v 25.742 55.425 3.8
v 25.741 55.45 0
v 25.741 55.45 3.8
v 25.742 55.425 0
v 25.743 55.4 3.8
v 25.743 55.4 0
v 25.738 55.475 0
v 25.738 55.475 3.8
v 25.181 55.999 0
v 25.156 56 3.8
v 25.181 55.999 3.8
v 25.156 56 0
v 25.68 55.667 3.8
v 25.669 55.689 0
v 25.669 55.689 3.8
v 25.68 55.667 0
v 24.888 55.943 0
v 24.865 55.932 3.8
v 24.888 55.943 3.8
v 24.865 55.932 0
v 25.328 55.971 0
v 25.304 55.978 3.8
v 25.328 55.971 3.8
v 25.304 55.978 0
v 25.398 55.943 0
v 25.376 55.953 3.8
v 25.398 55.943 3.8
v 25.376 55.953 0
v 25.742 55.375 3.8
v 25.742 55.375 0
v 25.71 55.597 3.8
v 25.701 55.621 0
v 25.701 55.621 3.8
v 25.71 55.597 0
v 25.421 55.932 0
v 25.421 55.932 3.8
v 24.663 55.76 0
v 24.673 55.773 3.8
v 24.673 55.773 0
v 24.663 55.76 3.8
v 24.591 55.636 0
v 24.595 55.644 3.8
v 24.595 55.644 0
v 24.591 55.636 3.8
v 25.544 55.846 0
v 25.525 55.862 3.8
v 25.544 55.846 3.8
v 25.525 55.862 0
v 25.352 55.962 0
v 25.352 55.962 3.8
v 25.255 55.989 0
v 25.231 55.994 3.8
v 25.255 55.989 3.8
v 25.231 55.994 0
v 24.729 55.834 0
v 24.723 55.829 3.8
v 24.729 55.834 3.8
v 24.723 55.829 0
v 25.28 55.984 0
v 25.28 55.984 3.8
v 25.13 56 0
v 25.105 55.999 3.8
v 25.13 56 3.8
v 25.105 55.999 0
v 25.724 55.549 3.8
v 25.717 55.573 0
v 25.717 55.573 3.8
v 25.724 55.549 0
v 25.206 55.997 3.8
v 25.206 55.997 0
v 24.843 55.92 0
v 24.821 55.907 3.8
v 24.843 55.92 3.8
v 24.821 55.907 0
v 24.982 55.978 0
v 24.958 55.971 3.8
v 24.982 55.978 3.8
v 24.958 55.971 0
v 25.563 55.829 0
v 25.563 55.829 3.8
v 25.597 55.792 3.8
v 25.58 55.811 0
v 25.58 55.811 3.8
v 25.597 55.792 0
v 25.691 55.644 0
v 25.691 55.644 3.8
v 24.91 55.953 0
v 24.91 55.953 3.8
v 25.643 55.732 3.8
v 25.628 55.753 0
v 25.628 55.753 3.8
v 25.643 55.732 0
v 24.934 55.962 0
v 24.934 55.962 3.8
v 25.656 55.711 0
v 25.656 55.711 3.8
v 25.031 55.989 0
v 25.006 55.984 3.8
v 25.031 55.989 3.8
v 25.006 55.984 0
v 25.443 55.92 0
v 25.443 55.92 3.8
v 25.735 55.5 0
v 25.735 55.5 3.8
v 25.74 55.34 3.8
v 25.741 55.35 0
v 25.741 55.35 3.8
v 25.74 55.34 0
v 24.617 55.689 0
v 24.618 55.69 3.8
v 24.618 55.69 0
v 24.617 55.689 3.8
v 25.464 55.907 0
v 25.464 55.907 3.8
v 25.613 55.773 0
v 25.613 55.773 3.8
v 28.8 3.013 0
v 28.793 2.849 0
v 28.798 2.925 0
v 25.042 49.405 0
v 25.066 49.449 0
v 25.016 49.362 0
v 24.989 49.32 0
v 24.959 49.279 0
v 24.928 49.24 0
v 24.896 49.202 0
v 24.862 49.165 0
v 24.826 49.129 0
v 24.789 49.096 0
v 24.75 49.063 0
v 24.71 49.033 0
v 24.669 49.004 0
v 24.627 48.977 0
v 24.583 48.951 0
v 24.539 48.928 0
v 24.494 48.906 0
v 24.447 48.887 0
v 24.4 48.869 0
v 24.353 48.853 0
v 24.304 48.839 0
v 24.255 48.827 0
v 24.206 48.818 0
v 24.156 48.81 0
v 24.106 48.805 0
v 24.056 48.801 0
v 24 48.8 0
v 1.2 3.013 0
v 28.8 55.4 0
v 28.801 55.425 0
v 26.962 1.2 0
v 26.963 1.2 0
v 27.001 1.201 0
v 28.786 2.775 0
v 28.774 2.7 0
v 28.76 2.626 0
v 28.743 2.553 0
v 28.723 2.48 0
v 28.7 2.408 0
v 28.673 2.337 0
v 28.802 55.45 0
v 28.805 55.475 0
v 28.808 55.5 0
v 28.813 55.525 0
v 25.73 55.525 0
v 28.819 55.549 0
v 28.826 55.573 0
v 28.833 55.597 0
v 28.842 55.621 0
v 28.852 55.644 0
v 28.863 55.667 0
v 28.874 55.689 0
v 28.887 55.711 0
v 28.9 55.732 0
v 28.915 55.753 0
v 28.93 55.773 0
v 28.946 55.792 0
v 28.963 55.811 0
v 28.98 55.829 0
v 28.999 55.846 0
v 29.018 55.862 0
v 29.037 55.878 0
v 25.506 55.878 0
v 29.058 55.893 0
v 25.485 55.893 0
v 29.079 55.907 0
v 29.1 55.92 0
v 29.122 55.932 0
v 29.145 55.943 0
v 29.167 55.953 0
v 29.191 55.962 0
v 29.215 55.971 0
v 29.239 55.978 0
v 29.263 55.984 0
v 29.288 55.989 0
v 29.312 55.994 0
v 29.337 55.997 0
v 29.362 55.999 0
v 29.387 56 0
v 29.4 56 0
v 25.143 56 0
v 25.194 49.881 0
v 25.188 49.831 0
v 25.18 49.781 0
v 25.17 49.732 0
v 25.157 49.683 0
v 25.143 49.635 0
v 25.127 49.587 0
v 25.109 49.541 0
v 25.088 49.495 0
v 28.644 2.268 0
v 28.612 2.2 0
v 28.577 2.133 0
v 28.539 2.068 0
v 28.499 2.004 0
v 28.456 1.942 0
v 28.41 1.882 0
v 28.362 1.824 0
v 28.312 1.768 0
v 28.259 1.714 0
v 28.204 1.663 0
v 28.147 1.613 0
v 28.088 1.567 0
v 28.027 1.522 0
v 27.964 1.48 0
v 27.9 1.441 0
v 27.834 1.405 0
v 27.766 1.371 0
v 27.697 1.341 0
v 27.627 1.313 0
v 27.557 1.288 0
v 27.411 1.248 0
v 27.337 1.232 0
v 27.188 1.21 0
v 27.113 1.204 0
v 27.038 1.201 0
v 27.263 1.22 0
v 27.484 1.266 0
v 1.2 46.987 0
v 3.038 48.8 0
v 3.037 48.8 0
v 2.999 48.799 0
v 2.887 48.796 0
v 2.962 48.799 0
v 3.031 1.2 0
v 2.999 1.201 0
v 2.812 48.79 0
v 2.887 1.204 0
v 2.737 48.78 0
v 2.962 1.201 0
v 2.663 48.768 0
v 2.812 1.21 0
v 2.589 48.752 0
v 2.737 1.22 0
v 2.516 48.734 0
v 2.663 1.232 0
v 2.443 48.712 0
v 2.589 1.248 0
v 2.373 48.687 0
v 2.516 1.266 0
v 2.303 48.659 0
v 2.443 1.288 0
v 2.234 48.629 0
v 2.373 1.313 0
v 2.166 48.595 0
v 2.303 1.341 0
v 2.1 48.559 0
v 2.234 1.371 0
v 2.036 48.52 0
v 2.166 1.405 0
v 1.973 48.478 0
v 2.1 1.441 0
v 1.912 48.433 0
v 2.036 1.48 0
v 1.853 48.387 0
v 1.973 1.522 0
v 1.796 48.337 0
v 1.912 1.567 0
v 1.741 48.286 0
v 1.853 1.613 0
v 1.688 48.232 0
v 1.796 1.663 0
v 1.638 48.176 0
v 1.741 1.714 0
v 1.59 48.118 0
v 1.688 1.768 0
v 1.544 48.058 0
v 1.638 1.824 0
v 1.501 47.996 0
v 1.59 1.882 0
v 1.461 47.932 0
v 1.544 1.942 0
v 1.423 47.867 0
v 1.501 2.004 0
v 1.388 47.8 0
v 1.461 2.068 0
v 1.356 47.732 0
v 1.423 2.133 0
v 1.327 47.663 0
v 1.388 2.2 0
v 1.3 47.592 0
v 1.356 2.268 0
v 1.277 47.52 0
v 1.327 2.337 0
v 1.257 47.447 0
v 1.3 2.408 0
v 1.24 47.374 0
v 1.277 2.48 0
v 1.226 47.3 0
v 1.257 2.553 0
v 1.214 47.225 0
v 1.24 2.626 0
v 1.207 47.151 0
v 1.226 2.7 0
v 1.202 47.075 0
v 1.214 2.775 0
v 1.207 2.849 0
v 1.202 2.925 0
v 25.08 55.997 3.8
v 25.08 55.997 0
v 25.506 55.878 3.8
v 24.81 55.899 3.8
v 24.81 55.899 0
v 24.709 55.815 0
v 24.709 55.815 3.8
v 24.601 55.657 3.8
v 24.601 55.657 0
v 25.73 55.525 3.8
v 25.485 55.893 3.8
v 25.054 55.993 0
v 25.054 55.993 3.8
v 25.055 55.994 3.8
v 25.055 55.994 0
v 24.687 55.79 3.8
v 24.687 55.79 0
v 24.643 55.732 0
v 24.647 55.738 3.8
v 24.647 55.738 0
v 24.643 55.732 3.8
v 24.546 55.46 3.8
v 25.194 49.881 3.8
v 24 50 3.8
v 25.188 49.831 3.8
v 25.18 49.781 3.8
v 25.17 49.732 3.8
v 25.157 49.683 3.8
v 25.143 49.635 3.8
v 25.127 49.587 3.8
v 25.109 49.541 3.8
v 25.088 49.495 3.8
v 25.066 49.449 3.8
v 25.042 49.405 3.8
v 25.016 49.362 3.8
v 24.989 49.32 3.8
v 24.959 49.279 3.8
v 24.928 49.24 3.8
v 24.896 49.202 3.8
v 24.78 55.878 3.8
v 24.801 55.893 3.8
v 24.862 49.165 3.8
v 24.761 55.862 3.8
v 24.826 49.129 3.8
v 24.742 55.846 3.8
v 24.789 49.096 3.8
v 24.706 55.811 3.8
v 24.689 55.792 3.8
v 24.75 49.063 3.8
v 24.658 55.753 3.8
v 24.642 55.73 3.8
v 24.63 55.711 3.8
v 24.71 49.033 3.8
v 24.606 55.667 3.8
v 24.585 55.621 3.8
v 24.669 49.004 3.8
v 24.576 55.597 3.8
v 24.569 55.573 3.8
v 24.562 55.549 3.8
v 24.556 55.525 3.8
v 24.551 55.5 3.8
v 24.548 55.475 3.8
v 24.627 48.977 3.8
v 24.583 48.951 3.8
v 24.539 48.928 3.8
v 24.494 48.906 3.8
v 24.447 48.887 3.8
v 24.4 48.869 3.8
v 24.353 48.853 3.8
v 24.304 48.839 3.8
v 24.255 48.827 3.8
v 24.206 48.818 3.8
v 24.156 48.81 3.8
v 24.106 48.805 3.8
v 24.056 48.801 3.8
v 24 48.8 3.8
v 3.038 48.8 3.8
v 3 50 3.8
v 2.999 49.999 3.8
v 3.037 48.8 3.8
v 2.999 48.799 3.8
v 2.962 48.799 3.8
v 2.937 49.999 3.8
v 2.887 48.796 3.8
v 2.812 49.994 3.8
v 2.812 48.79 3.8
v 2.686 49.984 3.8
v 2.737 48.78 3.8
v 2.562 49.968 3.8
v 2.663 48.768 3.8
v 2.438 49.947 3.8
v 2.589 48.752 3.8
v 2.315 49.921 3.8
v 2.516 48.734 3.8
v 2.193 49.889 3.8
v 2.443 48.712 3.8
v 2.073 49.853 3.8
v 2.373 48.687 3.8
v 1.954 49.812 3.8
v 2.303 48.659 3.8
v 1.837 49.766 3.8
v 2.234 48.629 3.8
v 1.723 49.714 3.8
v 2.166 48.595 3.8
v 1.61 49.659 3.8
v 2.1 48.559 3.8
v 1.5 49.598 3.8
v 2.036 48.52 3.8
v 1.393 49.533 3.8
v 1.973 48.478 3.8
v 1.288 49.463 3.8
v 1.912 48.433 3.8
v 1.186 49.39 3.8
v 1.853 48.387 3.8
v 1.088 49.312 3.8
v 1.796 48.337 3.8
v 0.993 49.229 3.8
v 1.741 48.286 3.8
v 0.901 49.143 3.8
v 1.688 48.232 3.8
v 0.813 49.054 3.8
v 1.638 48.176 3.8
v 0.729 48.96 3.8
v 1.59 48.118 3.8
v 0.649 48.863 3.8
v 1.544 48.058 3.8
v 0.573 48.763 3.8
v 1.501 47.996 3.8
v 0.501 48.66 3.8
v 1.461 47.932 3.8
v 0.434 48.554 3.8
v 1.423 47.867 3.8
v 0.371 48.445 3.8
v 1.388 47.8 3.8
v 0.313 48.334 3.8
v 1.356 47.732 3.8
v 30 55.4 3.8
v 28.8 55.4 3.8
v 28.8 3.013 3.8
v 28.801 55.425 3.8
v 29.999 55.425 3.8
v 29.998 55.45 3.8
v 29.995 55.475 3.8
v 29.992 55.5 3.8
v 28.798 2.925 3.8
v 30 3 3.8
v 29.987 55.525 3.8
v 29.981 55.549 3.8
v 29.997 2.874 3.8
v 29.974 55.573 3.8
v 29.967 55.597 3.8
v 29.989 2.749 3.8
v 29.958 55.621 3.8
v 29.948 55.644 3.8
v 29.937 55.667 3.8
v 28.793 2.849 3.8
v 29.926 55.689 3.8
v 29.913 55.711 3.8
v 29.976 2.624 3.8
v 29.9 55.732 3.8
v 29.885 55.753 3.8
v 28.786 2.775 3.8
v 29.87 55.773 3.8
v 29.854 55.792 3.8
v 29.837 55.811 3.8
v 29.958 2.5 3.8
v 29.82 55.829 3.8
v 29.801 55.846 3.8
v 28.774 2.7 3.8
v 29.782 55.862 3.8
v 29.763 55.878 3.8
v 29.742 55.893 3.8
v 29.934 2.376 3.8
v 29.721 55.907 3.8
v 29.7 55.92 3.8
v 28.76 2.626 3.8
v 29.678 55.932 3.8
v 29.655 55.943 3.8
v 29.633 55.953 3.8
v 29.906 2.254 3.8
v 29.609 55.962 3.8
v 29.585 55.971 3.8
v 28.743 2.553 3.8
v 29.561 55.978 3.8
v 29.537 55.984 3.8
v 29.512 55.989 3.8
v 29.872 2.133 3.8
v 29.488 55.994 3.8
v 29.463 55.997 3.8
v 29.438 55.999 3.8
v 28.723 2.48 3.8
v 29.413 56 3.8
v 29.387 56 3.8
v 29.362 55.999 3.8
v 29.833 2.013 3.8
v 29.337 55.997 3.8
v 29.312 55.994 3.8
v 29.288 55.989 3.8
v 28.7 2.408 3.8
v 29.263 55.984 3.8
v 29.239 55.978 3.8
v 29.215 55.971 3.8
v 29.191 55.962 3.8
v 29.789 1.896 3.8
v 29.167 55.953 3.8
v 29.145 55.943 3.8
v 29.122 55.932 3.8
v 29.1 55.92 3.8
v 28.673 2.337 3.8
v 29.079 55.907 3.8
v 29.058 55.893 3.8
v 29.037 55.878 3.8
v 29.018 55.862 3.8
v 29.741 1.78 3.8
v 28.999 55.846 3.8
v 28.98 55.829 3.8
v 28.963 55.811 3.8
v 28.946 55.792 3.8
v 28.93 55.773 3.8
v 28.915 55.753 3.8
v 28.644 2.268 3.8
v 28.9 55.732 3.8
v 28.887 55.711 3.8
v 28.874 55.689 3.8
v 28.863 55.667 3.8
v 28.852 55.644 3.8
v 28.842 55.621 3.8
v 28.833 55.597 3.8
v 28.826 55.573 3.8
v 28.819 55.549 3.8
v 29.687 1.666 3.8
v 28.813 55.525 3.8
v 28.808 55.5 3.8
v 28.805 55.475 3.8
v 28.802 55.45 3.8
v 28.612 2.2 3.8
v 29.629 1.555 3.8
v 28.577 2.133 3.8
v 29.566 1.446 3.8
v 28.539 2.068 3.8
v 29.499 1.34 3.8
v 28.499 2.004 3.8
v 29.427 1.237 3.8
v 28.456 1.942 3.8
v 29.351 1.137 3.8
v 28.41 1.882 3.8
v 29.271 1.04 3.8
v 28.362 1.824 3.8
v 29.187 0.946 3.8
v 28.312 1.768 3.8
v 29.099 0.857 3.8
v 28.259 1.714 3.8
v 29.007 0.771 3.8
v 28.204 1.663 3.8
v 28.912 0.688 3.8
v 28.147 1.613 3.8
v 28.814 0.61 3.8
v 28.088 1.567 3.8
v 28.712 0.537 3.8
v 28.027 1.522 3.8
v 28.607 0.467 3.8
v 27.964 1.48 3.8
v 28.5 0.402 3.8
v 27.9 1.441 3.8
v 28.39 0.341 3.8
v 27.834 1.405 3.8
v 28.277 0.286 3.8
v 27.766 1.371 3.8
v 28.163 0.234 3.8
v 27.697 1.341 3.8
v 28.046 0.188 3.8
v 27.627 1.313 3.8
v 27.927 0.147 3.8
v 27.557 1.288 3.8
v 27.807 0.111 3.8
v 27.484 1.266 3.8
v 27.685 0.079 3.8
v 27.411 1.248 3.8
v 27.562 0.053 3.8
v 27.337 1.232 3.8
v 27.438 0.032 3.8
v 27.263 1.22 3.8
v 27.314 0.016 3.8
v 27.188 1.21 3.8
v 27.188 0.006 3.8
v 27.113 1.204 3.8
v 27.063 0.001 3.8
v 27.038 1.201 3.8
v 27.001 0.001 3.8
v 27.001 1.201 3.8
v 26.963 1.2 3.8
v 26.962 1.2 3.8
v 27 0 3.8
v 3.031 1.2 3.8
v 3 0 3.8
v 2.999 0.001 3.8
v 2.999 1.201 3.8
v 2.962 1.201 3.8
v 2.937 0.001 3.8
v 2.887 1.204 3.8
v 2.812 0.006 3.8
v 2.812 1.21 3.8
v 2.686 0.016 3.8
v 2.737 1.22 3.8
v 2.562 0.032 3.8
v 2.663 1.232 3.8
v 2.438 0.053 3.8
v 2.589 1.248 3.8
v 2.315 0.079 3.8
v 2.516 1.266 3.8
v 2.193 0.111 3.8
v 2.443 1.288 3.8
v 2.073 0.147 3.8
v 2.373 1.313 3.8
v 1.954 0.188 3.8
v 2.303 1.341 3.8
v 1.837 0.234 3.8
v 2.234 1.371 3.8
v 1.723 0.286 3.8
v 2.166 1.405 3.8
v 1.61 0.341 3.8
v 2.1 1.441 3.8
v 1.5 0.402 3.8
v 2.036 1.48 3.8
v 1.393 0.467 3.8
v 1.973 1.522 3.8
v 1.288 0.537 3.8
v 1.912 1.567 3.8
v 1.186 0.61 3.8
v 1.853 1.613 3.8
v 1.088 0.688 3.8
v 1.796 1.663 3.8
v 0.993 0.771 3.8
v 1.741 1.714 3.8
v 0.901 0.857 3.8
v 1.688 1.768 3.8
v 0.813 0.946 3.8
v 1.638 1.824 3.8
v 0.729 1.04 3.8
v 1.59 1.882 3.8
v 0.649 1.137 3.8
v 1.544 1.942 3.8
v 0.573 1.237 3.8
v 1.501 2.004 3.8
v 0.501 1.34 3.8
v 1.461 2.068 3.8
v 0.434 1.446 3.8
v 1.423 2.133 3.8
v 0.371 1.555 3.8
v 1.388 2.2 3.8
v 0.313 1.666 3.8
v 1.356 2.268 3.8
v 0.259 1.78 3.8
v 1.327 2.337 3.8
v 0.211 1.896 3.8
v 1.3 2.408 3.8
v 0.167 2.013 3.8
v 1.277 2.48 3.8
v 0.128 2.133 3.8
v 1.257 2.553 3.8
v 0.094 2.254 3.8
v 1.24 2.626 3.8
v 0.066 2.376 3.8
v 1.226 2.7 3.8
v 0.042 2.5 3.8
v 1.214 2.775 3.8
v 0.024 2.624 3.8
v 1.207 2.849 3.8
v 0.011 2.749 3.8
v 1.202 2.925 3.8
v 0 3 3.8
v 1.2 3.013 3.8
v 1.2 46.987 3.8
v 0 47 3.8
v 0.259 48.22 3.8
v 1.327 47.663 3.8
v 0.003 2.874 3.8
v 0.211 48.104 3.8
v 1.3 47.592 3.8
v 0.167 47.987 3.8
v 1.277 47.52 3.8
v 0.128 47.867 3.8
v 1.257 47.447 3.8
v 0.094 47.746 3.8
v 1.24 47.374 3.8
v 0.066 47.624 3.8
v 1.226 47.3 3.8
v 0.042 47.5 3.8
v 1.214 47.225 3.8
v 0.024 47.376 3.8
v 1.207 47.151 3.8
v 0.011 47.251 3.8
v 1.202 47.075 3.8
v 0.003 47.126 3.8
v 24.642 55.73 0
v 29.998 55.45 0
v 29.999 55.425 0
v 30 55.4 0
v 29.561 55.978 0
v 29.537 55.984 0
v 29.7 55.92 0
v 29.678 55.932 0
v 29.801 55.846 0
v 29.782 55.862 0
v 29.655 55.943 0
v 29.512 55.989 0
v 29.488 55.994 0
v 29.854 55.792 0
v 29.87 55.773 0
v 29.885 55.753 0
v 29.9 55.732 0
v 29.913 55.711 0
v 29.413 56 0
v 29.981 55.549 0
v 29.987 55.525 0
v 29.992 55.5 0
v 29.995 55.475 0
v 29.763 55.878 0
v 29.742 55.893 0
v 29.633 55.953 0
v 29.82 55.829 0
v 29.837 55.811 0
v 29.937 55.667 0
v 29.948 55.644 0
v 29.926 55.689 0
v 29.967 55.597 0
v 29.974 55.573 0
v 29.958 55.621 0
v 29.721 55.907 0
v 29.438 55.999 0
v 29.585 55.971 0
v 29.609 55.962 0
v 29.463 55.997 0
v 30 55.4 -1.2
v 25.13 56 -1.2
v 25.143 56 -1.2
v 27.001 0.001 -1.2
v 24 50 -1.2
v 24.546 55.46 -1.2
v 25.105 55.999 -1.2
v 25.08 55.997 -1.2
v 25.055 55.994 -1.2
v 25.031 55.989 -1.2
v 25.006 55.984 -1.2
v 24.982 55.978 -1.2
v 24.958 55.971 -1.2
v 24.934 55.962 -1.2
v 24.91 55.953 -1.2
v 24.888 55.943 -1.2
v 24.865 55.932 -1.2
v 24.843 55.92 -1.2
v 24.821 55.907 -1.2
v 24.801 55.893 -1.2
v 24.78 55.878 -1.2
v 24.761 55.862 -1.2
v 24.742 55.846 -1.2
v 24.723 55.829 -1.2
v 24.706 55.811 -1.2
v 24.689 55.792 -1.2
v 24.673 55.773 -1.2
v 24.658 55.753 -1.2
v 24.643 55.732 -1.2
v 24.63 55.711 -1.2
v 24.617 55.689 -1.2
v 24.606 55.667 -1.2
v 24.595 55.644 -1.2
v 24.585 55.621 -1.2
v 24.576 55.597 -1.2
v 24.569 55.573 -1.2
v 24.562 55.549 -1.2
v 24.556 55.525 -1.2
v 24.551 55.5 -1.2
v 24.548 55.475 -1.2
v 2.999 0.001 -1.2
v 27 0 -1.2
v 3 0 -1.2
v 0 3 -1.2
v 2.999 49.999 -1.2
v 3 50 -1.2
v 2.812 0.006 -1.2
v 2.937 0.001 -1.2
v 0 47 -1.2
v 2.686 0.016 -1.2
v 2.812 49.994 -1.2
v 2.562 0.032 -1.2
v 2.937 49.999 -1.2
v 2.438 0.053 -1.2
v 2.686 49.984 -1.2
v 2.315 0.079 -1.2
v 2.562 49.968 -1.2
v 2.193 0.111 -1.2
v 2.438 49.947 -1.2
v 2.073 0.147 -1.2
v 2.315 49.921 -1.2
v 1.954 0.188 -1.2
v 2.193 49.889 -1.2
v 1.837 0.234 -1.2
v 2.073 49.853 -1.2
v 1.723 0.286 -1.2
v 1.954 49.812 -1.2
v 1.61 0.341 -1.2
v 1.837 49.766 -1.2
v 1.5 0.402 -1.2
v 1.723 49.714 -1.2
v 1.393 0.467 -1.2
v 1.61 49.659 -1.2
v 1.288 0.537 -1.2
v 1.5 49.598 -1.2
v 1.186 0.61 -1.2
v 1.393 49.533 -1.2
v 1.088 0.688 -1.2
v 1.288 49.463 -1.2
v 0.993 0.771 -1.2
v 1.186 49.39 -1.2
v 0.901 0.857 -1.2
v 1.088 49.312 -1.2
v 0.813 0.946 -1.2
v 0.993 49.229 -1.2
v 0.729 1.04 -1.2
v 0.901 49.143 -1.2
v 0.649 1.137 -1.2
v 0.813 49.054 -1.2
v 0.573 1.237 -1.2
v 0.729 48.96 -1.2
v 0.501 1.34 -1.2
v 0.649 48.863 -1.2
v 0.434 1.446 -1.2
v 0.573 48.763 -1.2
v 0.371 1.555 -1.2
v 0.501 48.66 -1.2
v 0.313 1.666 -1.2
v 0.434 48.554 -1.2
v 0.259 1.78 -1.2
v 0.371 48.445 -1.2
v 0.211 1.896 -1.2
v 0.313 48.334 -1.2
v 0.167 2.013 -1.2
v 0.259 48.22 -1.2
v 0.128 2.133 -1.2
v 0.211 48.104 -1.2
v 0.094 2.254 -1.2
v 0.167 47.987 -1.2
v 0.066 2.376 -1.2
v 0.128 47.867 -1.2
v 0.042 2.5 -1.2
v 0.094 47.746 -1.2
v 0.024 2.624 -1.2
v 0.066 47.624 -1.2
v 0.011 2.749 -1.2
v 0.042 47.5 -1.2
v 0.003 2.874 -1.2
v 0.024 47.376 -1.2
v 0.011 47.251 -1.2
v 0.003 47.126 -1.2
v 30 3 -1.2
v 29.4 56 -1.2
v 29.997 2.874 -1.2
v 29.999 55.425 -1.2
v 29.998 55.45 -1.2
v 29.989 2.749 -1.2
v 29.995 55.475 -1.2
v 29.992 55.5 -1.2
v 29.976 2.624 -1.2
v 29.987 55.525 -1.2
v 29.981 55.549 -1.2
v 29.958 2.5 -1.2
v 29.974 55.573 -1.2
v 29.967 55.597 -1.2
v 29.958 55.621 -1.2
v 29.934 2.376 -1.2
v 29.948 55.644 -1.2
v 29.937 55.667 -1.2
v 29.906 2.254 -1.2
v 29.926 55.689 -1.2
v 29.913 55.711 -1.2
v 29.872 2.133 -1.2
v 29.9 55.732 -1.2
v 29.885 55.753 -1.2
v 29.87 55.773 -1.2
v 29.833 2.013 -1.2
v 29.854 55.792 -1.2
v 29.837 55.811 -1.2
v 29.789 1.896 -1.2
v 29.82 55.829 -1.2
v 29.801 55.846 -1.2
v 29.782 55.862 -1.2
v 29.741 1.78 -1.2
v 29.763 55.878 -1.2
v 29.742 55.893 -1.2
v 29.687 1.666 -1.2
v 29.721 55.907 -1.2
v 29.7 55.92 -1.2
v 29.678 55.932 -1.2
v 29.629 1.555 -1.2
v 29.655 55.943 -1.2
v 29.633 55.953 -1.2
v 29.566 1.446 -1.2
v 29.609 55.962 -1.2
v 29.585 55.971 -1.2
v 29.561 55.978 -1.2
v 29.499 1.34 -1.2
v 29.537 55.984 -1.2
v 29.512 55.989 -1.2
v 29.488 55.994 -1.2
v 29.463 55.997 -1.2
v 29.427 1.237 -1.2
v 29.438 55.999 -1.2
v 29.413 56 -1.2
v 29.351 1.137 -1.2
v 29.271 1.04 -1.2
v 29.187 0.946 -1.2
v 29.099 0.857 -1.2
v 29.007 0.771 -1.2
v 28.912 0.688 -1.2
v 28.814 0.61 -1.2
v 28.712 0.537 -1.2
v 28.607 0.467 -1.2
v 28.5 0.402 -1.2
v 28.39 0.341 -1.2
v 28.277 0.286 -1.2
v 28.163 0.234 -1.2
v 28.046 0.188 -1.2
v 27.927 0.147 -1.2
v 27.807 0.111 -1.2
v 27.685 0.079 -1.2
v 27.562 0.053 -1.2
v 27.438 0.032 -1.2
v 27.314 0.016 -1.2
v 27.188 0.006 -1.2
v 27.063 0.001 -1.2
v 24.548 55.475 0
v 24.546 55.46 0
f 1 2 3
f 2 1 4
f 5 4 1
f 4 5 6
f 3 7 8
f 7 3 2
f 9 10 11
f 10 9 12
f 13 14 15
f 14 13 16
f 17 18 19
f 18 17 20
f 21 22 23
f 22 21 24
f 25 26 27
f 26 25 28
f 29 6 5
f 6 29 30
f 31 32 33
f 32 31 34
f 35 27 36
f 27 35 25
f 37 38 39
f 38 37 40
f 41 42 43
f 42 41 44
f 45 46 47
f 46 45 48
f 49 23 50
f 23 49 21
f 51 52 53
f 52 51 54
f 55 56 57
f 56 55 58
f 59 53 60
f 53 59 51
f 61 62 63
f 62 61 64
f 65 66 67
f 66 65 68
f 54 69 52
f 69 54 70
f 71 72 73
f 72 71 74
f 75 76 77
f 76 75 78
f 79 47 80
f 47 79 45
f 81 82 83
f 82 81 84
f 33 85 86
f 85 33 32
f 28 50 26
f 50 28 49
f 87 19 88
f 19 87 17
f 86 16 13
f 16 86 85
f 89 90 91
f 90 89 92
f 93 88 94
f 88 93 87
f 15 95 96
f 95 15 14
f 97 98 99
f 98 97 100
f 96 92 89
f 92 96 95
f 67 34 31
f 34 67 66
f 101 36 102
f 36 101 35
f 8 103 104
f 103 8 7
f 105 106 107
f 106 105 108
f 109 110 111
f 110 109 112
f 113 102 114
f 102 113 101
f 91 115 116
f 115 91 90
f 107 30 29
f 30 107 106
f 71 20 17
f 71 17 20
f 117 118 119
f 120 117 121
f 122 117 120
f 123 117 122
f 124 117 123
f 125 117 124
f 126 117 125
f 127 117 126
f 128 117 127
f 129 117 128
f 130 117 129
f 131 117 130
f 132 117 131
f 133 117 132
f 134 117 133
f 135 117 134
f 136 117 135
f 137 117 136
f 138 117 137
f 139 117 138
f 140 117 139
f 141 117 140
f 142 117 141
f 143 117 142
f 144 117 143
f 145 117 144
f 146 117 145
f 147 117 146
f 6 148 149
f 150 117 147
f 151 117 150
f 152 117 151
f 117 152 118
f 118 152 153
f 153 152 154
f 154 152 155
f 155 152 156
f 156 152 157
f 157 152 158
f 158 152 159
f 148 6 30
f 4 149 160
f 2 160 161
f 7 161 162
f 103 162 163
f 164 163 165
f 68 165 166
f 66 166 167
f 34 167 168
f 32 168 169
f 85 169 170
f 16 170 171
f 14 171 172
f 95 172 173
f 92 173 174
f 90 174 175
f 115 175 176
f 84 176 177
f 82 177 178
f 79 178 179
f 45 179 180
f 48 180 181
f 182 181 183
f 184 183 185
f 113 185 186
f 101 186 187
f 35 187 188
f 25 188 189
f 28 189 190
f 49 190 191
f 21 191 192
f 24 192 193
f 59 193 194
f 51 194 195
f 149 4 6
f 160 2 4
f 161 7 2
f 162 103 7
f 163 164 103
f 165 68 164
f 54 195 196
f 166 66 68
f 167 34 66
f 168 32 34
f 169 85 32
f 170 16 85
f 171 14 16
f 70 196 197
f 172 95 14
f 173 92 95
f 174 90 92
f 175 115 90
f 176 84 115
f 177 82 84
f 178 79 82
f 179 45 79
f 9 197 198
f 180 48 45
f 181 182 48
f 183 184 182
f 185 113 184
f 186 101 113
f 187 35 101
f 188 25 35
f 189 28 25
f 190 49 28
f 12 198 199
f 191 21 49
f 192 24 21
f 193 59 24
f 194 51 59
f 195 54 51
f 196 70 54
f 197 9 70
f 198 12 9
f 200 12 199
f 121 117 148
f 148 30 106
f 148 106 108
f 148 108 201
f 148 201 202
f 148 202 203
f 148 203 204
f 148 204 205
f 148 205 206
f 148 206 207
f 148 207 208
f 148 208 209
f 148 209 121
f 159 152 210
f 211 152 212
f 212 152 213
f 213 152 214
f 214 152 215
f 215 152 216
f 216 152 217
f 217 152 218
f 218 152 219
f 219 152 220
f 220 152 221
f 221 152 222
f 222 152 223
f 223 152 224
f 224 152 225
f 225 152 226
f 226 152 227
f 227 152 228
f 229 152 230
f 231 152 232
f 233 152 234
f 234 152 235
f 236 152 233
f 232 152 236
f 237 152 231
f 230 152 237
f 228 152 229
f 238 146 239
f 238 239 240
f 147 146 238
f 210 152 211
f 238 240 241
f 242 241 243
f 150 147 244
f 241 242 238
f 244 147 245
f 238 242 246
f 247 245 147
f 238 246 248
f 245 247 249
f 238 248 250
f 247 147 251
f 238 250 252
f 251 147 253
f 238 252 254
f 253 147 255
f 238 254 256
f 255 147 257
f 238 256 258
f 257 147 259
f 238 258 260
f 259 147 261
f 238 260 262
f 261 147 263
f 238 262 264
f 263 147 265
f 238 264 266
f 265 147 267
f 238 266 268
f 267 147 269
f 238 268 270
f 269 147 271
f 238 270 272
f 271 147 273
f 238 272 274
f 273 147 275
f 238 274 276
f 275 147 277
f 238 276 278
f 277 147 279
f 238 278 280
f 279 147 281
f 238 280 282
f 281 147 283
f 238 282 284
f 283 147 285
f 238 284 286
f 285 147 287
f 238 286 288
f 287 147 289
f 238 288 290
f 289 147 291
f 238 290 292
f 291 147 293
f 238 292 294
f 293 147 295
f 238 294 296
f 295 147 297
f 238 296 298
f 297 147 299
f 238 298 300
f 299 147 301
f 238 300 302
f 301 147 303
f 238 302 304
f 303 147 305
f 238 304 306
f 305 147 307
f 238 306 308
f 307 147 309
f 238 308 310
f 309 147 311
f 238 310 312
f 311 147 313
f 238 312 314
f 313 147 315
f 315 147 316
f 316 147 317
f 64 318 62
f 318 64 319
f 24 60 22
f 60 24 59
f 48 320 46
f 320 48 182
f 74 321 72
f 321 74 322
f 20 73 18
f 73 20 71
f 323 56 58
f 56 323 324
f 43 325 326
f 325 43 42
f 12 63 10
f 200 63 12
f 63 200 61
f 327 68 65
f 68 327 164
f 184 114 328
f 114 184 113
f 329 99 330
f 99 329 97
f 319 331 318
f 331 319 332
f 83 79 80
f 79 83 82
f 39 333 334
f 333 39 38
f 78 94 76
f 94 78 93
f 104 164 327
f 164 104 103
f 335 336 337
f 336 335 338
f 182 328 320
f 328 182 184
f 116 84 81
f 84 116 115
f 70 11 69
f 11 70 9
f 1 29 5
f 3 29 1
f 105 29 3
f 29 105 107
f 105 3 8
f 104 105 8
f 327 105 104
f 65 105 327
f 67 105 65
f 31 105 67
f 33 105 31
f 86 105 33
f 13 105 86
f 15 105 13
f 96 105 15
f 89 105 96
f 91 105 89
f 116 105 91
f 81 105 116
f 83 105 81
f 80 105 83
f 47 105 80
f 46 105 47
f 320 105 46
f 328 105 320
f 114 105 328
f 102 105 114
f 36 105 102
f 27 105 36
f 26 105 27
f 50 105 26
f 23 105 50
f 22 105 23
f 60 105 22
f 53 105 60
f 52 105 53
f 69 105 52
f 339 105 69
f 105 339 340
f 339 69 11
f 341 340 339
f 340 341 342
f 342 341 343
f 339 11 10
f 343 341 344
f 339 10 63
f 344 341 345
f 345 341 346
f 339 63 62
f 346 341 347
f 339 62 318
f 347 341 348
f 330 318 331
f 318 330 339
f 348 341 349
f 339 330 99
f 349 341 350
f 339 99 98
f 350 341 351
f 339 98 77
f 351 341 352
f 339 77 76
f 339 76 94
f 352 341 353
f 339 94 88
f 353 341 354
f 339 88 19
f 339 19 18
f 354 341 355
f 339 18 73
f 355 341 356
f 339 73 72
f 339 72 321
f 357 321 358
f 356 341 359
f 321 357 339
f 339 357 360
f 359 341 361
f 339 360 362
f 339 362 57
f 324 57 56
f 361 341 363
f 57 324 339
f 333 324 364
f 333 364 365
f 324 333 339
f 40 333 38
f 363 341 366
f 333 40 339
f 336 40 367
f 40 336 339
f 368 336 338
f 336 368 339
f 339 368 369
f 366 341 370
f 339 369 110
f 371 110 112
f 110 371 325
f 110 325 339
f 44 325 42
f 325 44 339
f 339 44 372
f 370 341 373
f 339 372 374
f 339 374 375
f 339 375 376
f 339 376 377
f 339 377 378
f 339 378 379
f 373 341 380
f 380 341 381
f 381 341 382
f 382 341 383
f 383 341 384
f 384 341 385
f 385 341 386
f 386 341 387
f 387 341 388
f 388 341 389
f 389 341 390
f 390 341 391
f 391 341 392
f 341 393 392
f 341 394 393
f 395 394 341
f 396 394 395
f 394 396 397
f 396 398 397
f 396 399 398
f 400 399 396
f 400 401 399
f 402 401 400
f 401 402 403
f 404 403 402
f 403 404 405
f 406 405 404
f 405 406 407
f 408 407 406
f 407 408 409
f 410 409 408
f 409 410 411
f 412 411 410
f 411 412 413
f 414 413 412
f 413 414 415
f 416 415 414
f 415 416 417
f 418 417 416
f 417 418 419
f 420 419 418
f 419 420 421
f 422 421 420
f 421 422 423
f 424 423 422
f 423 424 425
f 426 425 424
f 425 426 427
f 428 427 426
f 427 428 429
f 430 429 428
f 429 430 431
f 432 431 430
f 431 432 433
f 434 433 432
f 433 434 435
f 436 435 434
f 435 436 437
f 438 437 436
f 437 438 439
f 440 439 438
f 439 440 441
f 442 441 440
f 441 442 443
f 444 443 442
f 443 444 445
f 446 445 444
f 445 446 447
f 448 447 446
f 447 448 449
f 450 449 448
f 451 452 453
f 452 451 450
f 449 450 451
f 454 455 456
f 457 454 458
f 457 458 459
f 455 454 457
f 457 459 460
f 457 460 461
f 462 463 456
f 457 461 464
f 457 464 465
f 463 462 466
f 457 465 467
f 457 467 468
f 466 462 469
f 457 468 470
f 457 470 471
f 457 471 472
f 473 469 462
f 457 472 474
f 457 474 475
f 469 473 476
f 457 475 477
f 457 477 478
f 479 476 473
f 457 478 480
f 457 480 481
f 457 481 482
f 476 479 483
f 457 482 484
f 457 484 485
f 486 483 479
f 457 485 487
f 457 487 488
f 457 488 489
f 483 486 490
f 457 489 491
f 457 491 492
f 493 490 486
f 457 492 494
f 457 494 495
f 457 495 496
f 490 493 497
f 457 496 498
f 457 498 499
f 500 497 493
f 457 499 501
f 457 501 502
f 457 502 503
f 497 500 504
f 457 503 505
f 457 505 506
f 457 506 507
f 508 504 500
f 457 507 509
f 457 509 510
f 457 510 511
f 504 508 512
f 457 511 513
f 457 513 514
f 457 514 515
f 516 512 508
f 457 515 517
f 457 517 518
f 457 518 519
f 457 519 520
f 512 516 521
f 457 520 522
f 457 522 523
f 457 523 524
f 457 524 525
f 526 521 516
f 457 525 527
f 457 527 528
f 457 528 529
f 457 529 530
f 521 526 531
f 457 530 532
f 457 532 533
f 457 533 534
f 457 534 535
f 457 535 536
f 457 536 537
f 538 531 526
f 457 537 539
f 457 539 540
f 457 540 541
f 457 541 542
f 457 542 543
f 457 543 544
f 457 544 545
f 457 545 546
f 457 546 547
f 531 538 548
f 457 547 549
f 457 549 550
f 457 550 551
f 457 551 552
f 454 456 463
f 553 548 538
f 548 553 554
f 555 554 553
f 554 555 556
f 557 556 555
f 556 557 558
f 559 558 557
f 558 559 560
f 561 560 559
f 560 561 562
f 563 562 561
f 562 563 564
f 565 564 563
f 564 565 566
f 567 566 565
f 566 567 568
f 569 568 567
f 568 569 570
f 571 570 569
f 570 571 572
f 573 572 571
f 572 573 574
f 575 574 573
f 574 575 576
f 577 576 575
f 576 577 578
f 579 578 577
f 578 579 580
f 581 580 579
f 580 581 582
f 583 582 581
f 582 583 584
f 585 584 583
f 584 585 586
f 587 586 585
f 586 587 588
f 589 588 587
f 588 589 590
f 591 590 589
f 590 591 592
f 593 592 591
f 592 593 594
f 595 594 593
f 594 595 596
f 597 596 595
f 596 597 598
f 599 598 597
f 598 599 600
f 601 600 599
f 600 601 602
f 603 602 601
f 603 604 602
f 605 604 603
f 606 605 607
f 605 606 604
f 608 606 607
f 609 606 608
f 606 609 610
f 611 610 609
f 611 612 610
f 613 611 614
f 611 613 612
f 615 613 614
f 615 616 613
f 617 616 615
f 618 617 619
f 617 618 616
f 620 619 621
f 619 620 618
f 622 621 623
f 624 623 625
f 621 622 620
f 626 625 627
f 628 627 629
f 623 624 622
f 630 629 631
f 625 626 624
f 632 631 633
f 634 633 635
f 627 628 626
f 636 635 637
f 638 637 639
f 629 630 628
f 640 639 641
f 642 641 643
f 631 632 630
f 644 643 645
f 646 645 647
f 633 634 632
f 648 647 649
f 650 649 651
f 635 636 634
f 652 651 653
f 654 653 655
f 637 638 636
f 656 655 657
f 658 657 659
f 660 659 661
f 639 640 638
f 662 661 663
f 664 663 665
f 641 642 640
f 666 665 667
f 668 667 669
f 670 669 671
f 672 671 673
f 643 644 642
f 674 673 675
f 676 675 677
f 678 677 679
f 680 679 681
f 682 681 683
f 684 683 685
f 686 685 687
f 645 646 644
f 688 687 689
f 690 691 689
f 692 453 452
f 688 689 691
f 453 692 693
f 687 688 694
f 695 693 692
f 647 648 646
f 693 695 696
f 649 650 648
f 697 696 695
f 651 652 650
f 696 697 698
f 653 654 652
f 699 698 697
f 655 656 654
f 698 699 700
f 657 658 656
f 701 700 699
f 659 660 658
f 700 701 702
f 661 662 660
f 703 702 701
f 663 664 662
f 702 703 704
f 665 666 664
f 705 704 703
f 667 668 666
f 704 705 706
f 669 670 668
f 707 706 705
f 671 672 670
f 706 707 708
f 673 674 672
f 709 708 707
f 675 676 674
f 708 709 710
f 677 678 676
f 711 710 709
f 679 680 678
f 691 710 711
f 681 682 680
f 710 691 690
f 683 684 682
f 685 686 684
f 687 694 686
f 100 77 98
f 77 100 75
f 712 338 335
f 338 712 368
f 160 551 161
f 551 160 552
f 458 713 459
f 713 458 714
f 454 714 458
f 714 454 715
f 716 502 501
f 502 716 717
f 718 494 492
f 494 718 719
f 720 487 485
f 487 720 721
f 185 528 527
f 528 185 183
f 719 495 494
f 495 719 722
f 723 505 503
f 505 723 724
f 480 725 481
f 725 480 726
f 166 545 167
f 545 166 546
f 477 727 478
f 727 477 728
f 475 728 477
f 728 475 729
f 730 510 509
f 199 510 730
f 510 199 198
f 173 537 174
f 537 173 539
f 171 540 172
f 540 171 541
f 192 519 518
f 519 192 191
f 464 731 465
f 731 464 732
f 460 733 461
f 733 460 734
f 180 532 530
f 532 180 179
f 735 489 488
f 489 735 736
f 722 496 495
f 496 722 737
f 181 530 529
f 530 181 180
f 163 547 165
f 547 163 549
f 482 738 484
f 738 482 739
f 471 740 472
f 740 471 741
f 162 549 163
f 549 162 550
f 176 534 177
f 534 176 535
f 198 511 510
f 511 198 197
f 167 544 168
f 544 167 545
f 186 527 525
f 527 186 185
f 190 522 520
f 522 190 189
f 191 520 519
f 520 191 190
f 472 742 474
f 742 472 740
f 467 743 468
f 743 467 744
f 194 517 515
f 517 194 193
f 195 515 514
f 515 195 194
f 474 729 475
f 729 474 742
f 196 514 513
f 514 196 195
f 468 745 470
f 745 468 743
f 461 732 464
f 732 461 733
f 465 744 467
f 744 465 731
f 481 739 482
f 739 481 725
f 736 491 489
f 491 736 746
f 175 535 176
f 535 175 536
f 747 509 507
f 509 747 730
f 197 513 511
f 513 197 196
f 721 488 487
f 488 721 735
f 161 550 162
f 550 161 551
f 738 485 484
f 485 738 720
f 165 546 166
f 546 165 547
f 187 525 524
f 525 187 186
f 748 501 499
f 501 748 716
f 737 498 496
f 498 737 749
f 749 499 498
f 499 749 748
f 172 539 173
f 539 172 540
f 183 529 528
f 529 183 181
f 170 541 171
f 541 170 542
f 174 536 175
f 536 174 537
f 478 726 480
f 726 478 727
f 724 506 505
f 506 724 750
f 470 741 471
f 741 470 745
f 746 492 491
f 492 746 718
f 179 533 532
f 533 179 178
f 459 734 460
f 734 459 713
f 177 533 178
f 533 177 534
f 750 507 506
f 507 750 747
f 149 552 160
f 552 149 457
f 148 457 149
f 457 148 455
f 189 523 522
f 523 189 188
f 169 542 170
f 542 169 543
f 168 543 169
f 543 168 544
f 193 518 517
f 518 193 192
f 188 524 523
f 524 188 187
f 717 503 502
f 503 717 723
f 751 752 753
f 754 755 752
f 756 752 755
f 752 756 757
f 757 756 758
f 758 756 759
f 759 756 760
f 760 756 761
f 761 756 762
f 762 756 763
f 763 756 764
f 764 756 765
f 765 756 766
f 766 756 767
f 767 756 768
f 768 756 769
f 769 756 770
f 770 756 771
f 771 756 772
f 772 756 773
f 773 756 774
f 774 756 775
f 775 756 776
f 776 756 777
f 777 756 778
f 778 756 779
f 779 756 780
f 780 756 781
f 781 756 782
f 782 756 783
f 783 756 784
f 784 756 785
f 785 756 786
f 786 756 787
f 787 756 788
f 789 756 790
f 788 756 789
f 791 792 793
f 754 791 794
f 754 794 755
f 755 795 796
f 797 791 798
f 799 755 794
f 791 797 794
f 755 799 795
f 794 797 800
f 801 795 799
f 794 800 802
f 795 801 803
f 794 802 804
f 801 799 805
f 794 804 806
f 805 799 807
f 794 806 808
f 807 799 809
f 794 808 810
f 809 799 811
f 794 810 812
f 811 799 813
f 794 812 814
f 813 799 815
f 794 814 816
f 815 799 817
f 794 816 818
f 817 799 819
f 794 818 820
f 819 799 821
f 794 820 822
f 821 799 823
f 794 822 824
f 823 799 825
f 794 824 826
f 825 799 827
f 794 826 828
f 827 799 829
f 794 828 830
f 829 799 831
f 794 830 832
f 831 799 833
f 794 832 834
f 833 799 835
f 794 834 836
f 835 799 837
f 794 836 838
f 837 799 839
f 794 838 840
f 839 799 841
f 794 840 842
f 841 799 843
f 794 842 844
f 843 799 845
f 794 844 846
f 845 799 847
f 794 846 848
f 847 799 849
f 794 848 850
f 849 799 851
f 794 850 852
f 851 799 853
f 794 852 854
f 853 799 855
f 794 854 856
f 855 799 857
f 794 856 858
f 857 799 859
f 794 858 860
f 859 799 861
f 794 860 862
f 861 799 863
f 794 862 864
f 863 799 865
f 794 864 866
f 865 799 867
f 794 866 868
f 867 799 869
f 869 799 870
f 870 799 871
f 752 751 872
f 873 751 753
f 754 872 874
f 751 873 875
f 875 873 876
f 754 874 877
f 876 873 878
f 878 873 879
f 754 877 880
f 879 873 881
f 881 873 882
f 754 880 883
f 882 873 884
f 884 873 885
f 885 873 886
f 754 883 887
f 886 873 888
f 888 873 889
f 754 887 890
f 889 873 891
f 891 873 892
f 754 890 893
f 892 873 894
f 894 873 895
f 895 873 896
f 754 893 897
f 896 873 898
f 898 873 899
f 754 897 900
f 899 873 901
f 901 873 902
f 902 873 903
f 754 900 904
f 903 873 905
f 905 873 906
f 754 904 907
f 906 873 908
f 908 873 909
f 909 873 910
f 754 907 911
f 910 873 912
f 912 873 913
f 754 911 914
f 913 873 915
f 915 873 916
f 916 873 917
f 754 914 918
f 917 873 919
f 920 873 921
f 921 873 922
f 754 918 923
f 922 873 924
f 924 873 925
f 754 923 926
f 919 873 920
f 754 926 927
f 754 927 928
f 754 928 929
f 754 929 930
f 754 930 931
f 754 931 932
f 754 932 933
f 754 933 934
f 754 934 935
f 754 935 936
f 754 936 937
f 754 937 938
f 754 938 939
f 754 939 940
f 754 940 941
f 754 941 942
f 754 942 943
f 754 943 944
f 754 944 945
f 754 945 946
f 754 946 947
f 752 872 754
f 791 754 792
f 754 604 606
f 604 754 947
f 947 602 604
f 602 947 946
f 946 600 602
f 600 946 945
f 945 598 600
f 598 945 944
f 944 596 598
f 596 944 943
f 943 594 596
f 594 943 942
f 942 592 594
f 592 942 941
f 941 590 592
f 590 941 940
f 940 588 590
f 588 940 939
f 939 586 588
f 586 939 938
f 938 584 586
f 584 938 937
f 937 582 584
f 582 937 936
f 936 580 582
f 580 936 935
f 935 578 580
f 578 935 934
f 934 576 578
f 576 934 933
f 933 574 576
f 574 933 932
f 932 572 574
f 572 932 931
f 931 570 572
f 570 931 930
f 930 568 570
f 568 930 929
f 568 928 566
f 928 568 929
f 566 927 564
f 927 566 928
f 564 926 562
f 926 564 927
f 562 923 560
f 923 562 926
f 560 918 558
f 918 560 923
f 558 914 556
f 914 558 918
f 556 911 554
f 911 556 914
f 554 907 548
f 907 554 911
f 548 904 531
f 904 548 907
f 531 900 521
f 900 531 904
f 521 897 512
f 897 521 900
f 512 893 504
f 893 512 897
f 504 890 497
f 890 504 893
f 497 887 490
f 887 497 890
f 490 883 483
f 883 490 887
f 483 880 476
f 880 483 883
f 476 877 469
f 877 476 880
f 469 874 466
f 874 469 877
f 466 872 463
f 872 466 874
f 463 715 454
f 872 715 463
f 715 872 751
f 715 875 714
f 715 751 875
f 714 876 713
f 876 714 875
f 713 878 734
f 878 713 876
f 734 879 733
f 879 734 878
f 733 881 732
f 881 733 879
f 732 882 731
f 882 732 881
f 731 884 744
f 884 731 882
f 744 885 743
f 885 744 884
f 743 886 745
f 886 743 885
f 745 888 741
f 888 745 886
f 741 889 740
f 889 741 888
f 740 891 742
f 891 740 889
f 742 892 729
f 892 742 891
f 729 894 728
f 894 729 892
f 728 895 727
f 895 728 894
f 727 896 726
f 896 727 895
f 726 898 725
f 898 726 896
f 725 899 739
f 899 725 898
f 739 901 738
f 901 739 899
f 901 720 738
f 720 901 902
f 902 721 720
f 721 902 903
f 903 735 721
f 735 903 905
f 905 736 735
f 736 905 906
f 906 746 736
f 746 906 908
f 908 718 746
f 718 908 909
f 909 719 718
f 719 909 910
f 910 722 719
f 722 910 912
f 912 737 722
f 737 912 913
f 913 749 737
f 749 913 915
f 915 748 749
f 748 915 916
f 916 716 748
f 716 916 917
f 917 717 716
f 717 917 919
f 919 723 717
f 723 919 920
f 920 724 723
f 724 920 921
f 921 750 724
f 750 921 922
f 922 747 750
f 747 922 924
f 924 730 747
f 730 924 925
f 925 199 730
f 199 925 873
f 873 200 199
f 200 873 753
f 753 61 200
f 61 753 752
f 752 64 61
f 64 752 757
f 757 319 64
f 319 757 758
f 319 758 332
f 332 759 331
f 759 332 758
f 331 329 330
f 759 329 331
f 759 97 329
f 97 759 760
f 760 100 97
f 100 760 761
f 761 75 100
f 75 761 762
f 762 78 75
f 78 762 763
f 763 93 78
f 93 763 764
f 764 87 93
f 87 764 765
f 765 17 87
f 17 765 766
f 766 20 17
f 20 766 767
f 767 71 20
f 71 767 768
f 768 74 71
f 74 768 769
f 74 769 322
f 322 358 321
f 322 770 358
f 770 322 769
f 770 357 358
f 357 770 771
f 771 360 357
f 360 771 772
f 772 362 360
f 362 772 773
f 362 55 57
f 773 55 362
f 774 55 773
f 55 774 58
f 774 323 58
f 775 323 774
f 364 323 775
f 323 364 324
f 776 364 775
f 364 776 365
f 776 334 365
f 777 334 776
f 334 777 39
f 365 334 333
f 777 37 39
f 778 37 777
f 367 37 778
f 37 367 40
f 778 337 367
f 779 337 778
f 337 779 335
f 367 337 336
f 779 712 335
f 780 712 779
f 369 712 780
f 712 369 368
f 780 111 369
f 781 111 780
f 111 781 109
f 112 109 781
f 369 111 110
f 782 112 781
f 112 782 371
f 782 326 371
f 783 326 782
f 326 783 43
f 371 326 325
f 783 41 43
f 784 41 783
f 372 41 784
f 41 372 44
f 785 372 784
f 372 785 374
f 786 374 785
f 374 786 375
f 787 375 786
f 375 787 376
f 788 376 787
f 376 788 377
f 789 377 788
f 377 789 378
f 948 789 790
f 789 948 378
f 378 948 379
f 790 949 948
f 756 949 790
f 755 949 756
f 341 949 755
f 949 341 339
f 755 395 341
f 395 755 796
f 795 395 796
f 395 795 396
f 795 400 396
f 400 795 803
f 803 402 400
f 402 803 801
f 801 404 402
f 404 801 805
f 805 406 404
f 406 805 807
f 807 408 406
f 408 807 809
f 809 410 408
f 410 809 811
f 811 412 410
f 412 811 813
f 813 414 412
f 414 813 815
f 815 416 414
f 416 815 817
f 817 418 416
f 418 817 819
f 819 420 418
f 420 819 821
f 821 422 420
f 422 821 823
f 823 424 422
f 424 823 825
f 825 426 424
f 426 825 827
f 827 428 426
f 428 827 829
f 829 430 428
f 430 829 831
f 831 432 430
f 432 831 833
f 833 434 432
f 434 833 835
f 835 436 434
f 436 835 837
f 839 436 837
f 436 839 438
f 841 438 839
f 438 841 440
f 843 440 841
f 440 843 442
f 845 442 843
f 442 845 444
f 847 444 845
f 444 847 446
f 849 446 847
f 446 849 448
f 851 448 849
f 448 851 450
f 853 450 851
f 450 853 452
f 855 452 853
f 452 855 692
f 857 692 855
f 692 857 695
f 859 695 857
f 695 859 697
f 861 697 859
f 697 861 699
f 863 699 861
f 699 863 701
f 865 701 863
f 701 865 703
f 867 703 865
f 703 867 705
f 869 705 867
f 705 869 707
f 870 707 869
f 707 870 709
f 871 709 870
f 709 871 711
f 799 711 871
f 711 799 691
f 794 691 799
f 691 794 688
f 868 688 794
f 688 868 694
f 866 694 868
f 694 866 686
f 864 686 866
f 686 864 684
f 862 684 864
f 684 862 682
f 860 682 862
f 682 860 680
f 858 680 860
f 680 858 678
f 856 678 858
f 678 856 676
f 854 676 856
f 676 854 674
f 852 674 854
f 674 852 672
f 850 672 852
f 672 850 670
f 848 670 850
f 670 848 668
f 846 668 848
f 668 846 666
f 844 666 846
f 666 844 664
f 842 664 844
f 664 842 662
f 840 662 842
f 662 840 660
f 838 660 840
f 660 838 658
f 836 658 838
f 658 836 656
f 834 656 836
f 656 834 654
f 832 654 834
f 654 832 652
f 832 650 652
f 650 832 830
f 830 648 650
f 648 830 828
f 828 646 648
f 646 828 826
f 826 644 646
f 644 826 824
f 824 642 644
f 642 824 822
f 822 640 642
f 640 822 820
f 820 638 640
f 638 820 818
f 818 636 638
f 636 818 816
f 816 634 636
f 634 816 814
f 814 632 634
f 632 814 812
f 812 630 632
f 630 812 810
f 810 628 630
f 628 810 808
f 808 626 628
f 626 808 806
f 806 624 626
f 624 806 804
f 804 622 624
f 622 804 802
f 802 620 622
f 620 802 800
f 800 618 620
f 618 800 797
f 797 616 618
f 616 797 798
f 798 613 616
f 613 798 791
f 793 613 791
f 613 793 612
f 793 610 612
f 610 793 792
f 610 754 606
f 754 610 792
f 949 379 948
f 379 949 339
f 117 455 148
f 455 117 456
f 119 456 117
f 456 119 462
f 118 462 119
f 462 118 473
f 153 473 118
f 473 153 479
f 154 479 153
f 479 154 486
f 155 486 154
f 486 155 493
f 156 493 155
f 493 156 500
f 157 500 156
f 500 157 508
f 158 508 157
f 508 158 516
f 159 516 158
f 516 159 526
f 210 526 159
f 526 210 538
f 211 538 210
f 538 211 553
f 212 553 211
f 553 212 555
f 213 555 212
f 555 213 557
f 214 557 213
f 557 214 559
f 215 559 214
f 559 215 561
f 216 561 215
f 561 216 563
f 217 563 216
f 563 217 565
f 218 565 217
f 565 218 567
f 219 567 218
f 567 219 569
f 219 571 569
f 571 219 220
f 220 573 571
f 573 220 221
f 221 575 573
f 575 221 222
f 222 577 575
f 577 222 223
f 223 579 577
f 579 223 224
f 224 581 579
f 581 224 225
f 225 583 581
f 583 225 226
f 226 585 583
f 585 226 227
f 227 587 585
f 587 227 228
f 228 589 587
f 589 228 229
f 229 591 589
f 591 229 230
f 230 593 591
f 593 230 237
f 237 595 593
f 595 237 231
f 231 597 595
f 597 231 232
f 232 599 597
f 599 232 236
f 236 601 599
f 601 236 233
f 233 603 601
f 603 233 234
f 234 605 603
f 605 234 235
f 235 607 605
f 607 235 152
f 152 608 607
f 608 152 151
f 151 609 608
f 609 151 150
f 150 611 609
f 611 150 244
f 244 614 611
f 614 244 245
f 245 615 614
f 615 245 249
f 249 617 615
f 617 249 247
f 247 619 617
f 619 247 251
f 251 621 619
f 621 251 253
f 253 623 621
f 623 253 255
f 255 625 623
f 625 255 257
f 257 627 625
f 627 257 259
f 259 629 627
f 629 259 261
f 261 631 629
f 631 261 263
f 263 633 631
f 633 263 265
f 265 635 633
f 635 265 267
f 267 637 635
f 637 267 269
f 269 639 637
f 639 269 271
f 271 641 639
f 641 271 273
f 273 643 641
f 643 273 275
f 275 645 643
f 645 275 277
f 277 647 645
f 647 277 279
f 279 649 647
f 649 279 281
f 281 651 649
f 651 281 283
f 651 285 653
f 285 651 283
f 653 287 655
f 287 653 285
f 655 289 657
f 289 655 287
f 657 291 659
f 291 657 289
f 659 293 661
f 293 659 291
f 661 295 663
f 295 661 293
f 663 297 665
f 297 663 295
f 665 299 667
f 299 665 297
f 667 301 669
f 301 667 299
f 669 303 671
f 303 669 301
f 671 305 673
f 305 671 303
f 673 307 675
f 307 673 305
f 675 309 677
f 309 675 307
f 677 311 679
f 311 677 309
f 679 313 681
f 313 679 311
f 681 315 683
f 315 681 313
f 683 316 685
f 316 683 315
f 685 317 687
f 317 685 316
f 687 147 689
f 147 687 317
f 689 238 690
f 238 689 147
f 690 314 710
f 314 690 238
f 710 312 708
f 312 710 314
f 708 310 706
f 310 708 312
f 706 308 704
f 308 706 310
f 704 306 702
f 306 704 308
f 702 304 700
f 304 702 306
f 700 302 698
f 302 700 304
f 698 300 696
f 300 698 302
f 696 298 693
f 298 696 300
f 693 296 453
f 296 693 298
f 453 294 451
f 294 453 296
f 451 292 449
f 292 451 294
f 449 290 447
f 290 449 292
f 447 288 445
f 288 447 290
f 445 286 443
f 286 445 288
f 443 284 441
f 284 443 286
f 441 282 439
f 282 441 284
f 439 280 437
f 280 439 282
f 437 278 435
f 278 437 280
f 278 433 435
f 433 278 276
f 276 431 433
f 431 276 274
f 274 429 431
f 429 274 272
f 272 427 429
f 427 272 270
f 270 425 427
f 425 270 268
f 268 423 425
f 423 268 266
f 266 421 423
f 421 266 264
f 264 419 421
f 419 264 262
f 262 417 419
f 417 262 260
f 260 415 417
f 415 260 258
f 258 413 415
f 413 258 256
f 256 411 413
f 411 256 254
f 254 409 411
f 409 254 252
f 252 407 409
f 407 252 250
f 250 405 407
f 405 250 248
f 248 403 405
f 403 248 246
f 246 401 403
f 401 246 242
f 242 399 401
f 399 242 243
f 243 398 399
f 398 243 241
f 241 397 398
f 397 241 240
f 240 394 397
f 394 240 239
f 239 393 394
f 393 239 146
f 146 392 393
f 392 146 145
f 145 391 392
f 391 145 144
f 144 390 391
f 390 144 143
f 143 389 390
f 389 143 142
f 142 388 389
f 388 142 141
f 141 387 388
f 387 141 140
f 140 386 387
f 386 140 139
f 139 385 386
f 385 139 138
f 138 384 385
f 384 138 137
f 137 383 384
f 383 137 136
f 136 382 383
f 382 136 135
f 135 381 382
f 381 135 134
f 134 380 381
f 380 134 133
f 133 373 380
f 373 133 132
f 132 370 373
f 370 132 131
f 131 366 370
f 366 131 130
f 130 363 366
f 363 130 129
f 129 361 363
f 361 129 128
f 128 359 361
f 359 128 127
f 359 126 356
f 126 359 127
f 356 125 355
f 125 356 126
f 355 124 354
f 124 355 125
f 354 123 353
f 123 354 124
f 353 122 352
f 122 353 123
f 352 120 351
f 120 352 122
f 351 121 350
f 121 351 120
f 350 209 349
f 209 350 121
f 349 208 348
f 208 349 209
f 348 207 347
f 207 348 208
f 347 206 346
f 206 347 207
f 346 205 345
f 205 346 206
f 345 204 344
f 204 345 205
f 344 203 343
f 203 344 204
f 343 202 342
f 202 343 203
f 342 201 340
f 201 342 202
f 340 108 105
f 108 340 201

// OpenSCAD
// file: ../Functions/Math/trigonometry.scad
/**
 * Diversas funciones trigonométricas.
 *
 * @author  Joaquín Fernández
 * @url     https://gitlab.com/joaquinfq/openscad/blob/master/Functions/Math/trigonometry.scad
 * @license CC-BY-NC-4.0
 */

/**
 * Devuelve el valor del lado de un triángulo aplicando la ley de los cosenos.
 *
 * @param {Float} sideA Lado A del triángulo.
 * @param {Float} sideB Lado B del triángulo.
 * @param {Float} angle Ángulo que forman el lado A y el lado B.
 *
 * @return {Float}
 */
function lawOfCosines(sideA, sideB, angle) = sqrt(
    pow(sideA, 2) + pow(sideB, 2) - 2 * sideA * sideB * cos(angle)
);

/**
 * Calcula el valor del lado de un triángulo a partir de 2 ángulos y
 * 1 lado usando la ley de los senos:
 *
 *   sideA    sideB
 *   -----  = -----
 *   angleA   angleB
 *
 * @param {Float} sideA  Lado A del triángulo.
 * @param {Float} angleA Ángulo opuesto al lado A.
 * @param {Float} angleB Ángulo opuesto al lado B que se quiere calcular.
 *
 * @return {Float}
 */
function saa(sideA, angleA, angleB) = sideA * sin(angleB) / sin(angleA);

/**
 * Calcula el valor del lado de un triángulo a partir de 1 ángulo y
 * 2 lados usando la ley de los senos:
 *
 *   sideA    sideB
 *   -----  = -----
 *   angleA   angleB
 *
 * @param {Float} sideA  Lado A del triángulo.
 * @param {Float} sideB  Lado B del triángulo.
 * @param {Float} angleA Ángulo opuesto al lado A.
 *
 * @return {Float}
 */
function ssa(sideA, sideB, angleA) = asin(sideB * sin(angleA) / sideA);

/**
 * Calcula el valor de un cateto a partir de la hipotenusa y el otro cateto
 * usando el teormea de Pitágoras.
 *
 * @param {Float} hyp  Valor de la hipotenusa.
 * @param {Float} side Lado del triángulo.
 *
 * @return {Float}
 */
function pythagoras(hyp, side) = sqrt(pow(hyp, 2) - pow(side, 2));
// file: ../Functions/Math/line.scad
/**
 * Diversas funciones para trabajar con ecuaciones de la recta.
 *
 * @author  Joaquín Fernández
 * @url     https://gitlab.com/joaquinfq/openscad/blob/master/Functions/Math/line.scad
 * @license CC-BY-NC-4.0
 */
//-----------------------------------------------------------------------------
use <./trigonometry.scad>
//-----------------------------------------------------------------------------
/**
 * Dadas dos líneas que se cortan, devuelve la bisectriz.
 *
 * @param {Float[]} line1 Especificación de la línea 1 (0: pendiente, 1: coeficiente b).
 * @param {Float[]} line2 Especificación de la línea 2 (0: pendiente, 1: coeficiente b).
 *
 * @return {Float[]|undef}
 */
function bisectrix(line1, line2) = let(
        r1 = [ line1[0], line1[1], 1 ] * norm([ line2[0], 1 ]),
        r2 = [ line2[0], line2[1], 1 ] * norm([ line1[0], 1 ])
    ) r1[2] == r2[2]
        ? undef
        : [ r1[0] - r2[0], r1[1] - r2[1] ] / (r1[2] - r2[2]);

/**
 * Devuelve el ángulo entre las líneas formadas por los puntos especificados.
 *
 * @param {Float[]} point1 Punto de una recta en formato [ x, y ].
 * @param {Float[]} point2 Punto de la otra recta en formato [ x, y ].
 * @param {Float[]} common Punto común a las 2 rectas en formato [ x, y ].
 *
 * @return {Float}
 */
function getAngle(point1, point2, common) = let(
        eq1 = getEq(point1, common),
        eq2 = getEq(point2, common)
    )
    // atan((eq2[0] - eq1[0]) / (1 + eq2[0] * eq1[0]))
    acos((eq1[0] * eq2[0] + 1) / (norm([ eq1[0], 1 ]) * norm([ eq2[0], 1 ])));

/**
 * Devuelve la ecuación de la recta que pasa por los puntos especificados.
 *
 * @param {Float[]} point1 Punto 1 de la recta en formato [ x, y ].
 * @param {Float[]} point2 Punto 2 de la recta en formato [ x, y ].
 *
 * @return {Float[]} Ecuación en formato [ m, b ].
 */
function getEq(point1, point2) = let(m = slope(point1, point2)) [ m, point1[1] - m * point1[0] ];

/**
 * Devuelve la pendiente de la recta que pasa por los puntos especificados.
 *
 * @param {Float[]} point1 Punto 1 de la recta en formato [ x, y ].
 * @param {Float[]} point2 Punto 2 de la recta en formato [ x, y ].
 *
 * @return {Float}
 */
function slope(point1, point2) = (point2[1] - point1[1]) / (point2[0] - point1[0]);

/**
 * Dados 3 puntos de 2 rectas secantes, devuelve los puntos necesarios para realizar un empalme
 * así como el ángulo formado por ambas líneas.
 *
 * @param {Float[]} point1 Punto de una recta en formato [ x, y ].
 * @param {Float[]} point2 Punto de la otra recta en formato [ x, y ].
 * @param {Float[]} common Punto común a las 2 rectas en formato [ x, y ].
 * @param {Float}   radius Radio del empalme.
 *
 * @return {Float[]}
 */
function splice(point1, point2, common, radius) = let(
    x      = common[0],
    y      = common[1],
    eq1    = getEq(point1, common),
    eq2    = getEq(point2, common),
    angle  = getAngle(point1, point2, common),
    bis    = bisectrix(eq1, eq2),
    center = [ ((y - radius) - bis[1]) / bis[0], y - radius ],
    side   = pythagoras(norm([ x - center[0], y - center[1] ]), radius),
    x1     = x - side * cos(angle)
) [
    angle,
    [ x1, eq1[0] * x1 + eq1[1] ],
    center,
    [ x + side, y ]
];
// main file
/**
 * Bandeja usada como embudo para permitir guardar piezas pequeñas.
 *
 * @author  Joaquín Fernández
 * @url     https://gitlab.com/joaquinfq/openscad/blob/master/Storage/FunnelTray.scad
 * @license CC-BY-NC-4.0
 * @see     http://www.thingiverse.com/thing:3168339
 */
//-----------------------------------------------------------------------------
// Valores personalizables
//-----------------------------------------------------------------------------
funnelLength = 6;   // Longitud del embudo
funnelWidth  = 3;   // Ancho del embudo.
radius       = 3;   // Radio de los bordes.
thickness    = 1.2; // Grosor de las paredes.
trayHeight   = 5;   // Alto del contenedor de las cajas (eje Z).
trayLength   = 50;  // Largo del contenedor de las cajas (eje Y).
trayWidth    = 30;  // Ancho del contenedor de las cajas (eje X).
//-----------------------------------------------------------------------------
use <../Functions/Math/line.scad>
//-----------------------------------------------------------------------------
function coord(i)  = sign(points[i][0] - points[i + 1][0]) == sign(points[i][1] - points[i + 1][1])
    ? [ points[i + 1][0], points[i    ][1] ]
    : [ points[i    ][0], points[i + 1][1] ];

/**
 * Dibuja la base de la bandeja.
 */
module base()
{
    polygon(points = points);
    for (i = [ 0, 2, 4 ])
    {
        translate(coord(i))
        {
            circle(r = radius);
        }
    }
    for (i = [ 8, 11 ])
    {
        translate(points[i])
        {
            circle(r = r);
        }
    }
}
//-----------------------------------------------------------------------------
// Inicio del script.
//-----------------------------------------------------------------------------
$fn    = 150;
f      = funnelLength + thickness / 2;
r      = thickness / 2;
xf     = max(trayWidth - funnelWidth * 2, thickness + radius);
point0 = [ xf, trayLength ];
point1 = [ trayWidth - 2 * thickness - funnelWidth, trayLength + funnelLength ];
point2 = [ trayWidth - r, trayLength + funnelLength ];
eq     = getEq(point1, point0);
data   = splice(point0, point2, point1, r);
angle  = data[0];
points = [
    [ trayWidth, radius ],
    [ trayWidth - radius, 0 ],
    [ radius, 0 ],
    [ 0, radius ],
    [ 0, trayLength - radius ],
    [ radius, trayLength ],
    point0,
    data[1],
    data[2],
    data[3],
    point2,
    [ trayWidth - r, trayLength + funnelLength - r ],
    [ trayWidth, trayLength + funnelLength - r ],
    [ trayWidth, trayLength + f ],
];

translate([ 0, 0, - thickness ])
{
    linear_extrude(thickness)
    {
        base();
    }
}
difference()
{
    linear_extrude(trayHeight - thickness)
    {
        difference()
        {
            base();
            offset(-thickness)
            {
                base();
            }
            polygon(
                points = [
                    [ (points[8][1] - r - eq[1]) / eq[0] + thickness / sin(angle), points[8][1] - r ],
                    [ points[8][0] + r * sin(angle), points[8][1] - r * cos(angle) ],
                    points[8],
                    points[7],
                    points[9],
                    points[13],
                    points[12],
                    points[11],
                    [ points[11][0] - r, points[11][1] ],
                    [ points[11][0] - r, points[11][1] - r ],
                ]
            );
        }
    }
}
for (i = [ 8, 11 ])
{
    translate(points[i])
    {
        cylinder(r = r, h = trayHeight - thickness);
    }
}
